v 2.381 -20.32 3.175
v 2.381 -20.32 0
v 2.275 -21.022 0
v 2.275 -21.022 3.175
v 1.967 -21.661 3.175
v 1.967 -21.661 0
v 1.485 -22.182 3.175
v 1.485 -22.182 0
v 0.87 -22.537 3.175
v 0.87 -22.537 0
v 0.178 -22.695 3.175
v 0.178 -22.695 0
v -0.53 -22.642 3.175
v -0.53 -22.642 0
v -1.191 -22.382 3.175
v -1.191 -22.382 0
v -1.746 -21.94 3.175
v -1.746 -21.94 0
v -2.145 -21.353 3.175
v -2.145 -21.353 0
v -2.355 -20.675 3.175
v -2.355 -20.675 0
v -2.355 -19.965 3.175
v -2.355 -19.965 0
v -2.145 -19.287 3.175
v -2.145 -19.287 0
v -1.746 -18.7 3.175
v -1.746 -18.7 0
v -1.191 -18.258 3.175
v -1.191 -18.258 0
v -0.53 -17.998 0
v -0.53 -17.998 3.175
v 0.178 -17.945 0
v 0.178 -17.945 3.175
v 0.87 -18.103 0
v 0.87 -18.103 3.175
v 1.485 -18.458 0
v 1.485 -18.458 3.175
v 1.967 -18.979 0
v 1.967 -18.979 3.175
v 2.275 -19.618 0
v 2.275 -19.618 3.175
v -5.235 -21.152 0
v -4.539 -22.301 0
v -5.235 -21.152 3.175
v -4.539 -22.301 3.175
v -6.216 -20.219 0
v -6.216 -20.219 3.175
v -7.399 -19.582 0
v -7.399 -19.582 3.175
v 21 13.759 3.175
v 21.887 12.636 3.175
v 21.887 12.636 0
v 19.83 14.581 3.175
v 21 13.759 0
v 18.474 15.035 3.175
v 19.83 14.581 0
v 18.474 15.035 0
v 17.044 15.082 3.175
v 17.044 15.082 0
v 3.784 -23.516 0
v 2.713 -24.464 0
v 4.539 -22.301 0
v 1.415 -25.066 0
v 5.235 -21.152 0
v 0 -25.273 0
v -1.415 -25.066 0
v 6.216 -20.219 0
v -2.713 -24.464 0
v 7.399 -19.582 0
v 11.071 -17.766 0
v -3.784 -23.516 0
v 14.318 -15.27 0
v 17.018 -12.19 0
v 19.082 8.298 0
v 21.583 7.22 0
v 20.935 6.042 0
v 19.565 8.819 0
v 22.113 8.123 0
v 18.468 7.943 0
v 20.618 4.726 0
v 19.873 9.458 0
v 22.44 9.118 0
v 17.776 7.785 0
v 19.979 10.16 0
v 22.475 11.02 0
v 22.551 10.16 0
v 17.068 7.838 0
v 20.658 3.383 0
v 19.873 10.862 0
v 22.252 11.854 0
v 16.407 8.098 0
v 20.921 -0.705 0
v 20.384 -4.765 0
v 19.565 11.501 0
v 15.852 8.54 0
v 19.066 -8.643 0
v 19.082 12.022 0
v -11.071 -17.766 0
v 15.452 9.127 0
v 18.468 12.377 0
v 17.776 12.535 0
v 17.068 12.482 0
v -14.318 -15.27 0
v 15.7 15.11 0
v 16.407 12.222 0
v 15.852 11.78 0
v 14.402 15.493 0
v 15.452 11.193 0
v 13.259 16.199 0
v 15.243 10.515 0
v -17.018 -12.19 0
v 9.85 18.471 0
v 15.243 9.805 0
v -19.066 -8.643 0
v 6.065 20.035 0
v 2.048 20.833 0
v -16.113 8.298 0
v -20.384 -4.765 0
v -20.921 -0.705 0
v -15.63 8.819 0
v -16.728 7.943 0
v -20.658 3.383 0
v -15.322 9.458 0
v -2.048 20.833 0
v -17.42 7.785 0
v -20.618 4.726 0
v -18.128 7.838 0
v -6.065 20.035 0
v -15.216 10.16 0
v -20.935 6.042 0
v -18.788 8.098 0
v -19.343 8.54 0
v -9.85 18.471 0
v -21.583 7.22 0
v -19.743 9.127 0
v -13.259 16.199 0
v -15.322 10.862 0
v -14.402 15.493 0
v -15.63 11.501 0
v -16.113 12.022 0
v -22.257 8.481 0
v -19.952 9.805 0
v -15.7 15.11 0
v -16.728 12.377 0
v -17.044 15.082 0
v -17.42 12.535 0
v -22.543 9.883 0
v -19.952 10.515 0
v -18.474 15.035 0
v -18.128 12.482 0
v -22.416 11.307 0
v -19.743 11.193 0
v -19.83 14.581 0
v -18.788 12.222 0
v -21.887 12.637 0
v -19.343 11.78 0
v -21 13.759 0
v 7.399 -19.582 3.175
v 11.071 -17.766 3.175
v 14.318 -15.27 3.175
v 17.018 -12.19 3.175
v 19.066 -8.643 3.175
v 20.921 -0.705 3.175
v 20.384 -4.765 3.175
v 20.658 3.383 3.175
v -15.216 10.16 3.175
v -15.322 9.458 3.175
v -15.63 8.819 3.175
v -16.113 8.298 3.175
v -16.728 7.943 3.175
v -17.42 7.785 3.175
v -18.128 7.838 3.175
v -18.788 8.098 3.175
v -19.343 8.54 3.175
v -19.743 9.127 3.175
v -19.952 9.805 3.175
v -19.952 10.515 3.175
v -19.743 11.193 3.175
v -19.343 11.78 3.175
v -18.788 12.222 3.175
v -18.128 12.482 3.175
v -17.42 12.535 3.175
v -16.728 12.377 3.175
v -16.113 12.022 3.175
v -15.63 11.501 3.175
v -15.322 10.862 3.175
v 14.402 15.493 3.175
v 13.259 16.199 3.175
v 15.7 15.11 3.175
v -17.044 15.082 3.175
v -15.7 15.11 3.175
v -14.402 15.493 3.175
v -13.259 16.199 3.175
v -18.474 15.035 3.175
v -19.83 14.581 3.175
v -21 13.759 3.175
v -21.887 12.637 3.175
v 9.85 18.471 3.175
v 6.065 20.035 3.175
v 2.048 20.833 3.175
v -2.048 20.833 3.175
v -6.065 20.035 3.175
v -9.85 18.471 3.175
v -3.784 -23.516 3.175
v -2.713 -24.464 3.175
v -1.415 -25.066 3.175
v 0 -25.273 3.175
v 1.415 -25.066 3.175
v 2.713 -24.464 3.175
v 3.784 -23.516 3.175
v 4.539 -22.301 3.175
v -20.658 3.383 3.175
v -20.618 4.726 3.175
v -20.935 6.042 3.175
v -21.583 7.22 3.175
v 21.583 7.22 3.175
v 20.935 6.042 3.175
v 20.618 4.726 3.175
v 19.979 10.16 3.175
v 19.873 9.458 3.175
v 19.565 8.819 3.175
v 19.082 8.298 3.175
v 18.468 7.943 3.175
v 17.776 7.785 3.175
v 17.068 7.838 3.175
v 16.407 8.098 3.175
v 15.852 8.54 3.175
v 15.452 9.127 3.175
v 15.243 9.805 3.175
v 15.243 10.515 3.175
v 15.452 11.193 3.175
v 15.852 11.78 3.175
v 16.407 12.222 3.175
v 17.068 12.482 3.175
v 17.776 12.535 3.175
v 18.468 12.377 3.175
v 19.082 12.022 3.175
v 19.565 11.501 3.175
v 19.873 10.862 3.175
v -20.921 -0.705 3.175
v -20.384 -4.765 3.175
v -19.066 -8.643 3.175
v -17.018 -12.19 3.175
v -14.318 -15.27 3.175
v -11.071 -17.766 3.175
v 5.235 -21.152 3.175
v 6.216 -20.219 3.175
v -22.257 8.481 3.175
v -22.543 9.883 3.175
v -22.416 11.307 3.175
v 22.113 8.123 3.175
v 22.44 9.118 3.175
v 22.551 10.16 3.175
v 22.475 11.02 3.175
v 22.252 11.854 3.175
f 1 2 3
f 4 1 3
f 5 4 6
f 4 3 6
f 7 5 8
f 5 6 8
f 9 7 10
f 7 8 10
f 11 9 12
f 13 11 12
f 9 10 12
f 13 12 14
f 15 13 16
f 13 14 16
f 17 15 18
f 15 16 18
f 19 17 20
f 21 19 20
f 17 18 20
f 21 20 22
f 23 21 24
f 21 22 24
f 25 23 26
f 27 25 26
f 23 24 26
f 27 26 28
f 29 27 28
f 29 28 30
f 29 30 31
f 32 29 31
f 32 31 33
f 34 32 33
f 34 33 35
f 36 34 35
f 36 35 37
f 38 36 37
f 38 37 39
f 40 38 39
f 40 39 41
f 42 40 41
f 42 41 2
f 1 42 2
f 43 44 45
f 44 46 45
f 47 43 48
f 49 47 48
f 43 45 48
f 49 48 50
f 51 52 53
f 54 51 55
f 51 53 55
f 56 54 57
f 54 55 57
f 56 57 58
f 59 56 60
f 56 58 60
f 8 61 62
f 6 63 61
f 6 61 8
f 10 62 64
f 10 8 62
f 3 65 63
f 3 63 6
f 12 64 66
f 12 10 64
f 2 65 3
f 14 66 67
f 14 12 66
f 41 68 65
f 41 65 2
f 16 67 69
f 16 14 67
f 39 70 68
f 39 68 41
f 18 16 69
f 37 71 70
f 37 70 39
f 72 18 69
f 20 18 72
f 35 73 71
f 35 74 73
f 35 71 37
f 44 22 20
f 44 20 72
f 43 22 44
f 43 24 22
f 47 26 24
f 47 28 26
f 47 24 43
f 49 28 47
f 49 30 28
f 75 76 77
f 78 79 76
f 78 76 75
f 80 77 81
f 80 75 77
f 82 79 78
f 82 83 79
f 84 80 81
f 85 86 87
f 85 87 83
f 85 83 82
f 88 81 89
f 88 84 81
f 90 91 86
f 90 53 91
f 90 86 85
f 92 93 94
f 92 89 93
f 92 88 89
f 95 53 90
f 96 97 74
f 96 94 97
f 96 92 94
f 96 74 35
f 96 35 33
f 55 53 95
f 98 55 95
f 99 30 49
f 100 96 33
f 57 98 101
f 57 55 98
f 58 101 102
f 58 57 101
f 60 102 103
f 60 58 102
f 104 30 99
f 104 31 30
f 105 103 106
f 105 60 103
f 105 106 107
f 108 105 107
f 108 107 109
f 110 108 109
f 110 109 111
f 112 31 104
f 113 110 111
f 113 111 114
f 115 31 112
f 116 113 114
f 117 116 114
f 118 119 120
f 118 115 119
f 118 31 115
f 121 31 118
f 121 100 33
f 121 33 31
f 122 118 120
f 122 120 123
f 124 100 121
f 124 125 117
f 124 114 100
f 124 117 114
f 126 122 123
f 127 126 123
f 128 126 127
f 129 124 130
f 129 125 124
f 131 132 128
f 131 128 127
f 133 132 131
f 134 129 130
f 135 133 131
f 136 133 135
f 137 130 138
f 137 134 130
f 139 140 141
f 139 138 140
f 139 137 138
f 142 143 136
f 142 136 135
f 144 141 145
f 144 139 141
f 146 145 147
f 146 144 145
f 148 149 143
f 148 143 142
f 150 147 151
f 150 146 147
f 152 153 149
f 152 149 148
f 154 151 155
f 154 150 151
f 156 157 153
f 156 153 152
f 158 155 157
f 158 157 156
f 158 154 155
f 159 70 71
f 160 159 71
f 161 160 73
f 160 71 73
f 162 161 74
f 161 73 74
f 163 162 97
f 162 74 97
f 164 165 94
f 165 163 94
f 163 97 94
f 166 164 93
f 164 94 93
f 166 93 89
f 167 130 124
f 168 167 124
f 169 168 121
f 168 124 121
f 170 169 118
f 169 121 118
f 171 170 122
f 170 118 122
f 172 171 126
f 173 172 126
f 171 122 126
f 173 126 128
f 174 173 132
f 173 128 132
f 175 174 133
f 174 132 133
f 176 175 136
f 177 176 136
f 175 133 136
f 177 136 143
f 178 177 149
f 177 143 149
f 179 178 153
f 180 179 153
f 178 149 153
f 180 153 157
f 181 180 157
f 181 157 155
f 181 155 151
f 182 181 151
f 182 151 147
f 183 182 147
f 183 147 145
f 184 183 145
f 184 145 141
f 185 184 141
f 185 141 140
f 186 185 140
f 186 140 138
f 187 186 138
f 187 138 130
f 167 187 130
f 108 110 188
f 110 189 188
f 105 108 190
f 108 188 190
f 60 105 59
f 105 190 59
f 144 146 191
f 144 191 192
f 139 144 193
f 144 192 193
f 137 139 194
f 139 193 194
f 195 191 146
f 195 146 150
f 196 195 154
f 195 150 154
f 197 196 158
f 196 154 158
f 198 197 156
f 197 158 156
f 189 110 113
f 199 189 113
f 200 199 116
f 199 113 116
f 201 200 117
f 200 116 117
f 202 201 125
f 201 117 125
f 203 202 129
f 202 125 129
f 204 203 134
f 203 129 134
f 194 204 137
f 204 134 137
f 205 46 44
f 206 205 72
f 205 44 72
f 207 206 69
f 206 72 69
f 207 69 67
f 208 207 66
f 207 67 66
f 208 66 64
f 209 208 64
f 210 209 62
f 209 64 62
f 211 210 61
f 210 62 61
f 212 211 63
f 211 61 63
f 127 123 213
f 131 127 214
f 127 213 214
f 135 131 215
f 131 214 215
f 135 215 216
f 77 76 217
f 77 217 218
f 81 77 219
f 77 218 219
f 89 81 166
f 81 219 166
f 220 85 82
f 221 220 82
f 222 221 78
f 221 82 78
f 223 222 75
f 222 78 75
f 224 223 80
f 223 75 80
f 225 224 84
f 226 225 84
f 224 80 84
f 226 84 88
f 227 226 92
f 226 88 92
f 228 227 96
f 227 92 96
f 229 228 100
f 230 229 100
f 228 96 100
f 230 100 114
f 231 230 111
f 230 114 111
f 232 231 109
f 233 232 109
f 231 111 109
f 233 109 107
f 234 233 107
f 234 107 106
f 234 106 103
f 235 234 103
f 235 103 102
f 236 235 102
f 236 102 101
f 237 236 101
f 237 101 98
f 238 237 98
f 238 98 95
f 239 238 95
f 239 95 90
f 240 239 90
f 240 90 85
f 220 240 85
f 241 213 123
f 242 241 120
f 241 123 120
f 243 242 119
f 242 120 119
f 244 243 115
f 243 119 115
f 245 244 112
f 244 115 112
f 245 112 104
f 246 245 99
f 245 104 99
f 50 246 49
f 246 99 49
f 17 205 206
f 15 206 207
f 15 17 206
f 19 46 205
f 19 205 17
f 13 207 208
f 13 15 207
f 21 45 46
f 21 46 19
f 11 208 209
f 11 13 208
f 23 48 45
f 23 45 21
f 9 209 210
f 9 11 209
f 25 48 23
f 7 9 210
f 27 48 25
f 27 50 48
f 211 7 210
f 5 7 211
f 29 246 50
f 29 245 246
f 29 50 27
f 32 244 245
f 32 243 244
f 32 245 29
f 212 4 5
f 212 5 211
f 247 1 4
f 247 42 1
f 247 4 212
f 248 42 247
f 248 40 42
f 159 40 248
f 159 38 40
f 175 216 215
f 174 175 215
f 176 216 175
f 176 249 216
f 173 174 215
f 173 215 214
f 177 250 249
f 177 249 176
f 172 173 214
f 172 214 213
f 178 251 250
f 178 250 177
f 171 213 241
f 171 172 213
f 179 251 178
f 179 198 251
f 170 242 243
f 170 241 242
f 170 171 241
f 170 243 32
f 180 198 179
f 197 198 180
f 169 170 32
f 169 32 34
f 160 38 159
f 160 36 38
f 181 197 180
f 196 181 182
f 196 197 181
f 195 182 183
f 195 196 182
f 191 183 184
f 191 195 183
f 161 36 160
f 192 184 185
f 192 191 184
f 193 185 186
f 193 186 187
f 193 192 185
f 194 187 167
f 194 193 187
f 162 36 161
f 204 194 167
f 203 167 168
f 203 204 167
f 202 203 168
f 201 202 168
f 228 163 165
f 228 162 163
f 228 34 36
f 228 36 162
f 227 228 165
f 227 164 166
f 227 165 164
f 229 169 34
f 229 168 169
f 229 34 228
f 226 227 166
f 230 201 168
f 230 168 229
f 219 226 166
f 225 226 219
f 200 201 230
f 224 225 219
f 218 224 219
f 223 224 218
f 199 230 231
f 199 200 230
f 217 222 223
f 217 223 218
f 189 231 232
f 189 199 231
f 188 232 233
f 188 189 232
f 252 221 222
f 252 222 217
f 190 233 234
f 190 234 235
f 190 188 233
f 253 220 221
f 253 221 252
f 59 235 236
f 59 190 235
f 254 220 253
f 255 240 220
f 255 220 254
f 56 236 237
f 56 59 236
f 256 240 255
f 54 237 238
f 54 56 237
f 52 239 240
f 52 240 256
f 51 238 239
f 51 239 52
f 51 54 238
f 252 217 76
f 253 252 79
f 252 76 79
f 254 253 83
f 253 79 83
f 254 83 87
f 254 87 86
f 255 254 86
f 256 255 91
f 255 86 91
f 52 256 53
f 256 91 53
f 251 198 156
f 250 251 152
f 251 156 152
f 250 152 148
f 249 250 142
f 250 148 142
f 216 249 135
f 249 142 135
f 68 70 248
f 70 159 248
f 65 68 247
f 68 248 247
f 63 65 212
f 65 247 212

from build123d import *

# Parameters (mm, degrees)
F1_W      = 8.89
F1_H      = 3.175
F3_R      = 2.38125
F4_DEPTH  = 3.176
F7_DEPTH  = 3.176
F8_R      = 5.08
F9_R      = 27.6252152017
F10_DEPTH = 17.4535782288
F11_R     = 14.5350936127
F12_DEPTH = 3.175


# Not quite as in the source:
# - a fillet or chamfer that OpenCascade refuses, or shapes differently, is made with other operations: its cross-section is extruded or revolved along the edge and cut away or added


with BuildPart() as f2:
    # F1 (on Front) → F2 (revolve)
    with BuildSketch(Plane.XZ):
        with BuildLine():
            ThreePointArc((13.208, -11.9177163316), (13.0652297207, -14.7887805254), (12.3057501177, -17.5612494052))
            Line((12.3057501177, -17.5612494052), (16.383, -17.5612494052))
            Line((16.383, -17.5612494052), (16.383, 0))
            Line((16.383, 0), (16.383, 3.175))
            Line((16.383, 3.175), (13.208, 3.175))
            Line((13.208, 3.175), (13.208, -11.9177163316))
        make_face()
        with Locations((20.828, 1.5875)):
            Rectangle(F1_W, F1_H)
    revolve(axis=Axis((0, 0, -9.4681101426), (0, 0, 1)))

    # F3 (on face) → F4 (cut, through all)
    with BuildSketch(Plane(origin=(0, 0, 0), x_dir=(1, 0, 0), z_dir=(0, 0, -1))):
        with BuildLine():
            ThreePointArc((0, 17.93875), (1.6837980227, 18.6362019773), (2.38125, 20.32))
            ThreePointArc((2.38125, 20.32), (-1.6837980227, 22.0037980227), (0, 17.93875))
        make_face()
        with Locations((-17.5976362049, -10.16)):
            Circle(F3_R)
        with Locations((17.5976362049, -10.16)):
            Circle(F3_R)
    extrude(amount=-F4_DEPTH, mode=Mode.SUBTRACT)

    # F5: fillet of radius 5.08 on 1 edges, made by hand

    # F5_s1 → F5_t2 (revolve, cut)
    with BuildSketch(Plane.XZ):
        with BuildLine():
            ThreePointArc((11.303, -17.5612494052), (14.8951024484, -16.0733518536), (16.383, -12.4812494052))
            Line((16.383, -12.4812494052), (16.383, -17.5612494052))
            Line((16.383, -17.5612494052), (11.303, -17.5612494052))
        make_face()
    revolve(axis=Axis((0, 0, -17.5612494052), (0, 0, 1)), mode=Mode.SUBTRACT)

    # F6 (on face) → F7 (cut, through all)
    with BuildSketch(Plane(origin=(0, 0, 0), x_dir=(1, 0, 0), z_dir=(0, 0, -1))):
        with BuildLine():
            ThreePointArc((-4.952964542, 20.3387415379), (-3.495667473, 23.8289197652), (0, 25.273))
            ThreePointArc((0, 25.273), (-21.8870601005, 12.6364998776), (-21.8870598885, -12.6365002448))
            ThreePointArc((-21.8870598885, -12.6365002448), (-22.3842836342, -8.8871231844), (-20.0903491238, -5.8799776515))
            ThreePointArc((-20.0903491238, -5.8799776515), (-18.1286292594, 10.4665689829), (-4.952964542, 20.3387415379))
        make_face()
        with BuildLine():
            ThreePointArc((0, 25.273), (3.495667473, 23.8289197652), (4.952964542, 20.3387415379))
            ThreePointArc((4.952964542, 20.3387415379), (18.1286292594, 10.4665689829), (20.0903491238, -5.8799776515))
            ThreePointArc((20.0903491238, -5.8799776515), (21.8917377458, -7.6916197707), (22.5506362049, -10.16))
            ThreePointArc((22.5506362049, -10.16), (22.3818668231, -11.4419307281), (21.8870600322, -12.6364999959))
            ThreePointArc((21.8870600322, -12.6364999959), (24.4118434084, -6.5411337246), (25.273, 0))
            ThreePointArc((25.273, 0), (17.8707096809, 17.8707096809), (0, 25.273))
        make_face()
        with BuildLine():
            ThreePointArc((-15.1373845818, -14.4587638864), (-18.8886159884, -14.9417967542), (-21.8870598885, -12.6365002448))
            ThreePointArc((-21.8870598885, -12.6365002448), (1.437e-07, -25.273), (21.8870600322, -12.6364999959))
            ThreePointArc((21.8870600322, -12.6364999959), (18.8886161272, -14.9417967167), (15.1373845818, -14.4587638864))
            ThreePointArc((15.1373845818, -14.4587638864), (0, -20.9331379659), (-15.1373845818, -14.4587638864))
        make_face()
    extrude(amount=-F7_DEPTH, mode=Mode.SUBTRACT)

    # F8
    f8_edges = [f2.edges().sort_by_distance(p)[0] for p in [
        (-15.137385, 14.458764, 1.5875),
        (15.137385, 14.458764, 1.5875),
        (20.090349, 5.879978, 1.5875),
        (4.952965, -20.338742, 1.5875),
        (-4.952965, -20.338742, 1.5875),
        (-20.090349, 5.879978, 1.5875),
    ]]
    fillet(f8_edges, radius=F8_R)

    # F9 (on Top) → F10 (cut, through all)
    with BuildSketch(Plane.XY):
        Circle(F9_R)
    extrude(amount=-F10_DEPTH, mode=Mode.SUBTRACT)

    # F11 (on face) → F12 (join)
    with BuildSketch(Plane(origin=(0, 0, 0), x_dir=(1, 0, 0), z_dir=(0, 0, -1))):
        Circle(F11_R)
    extrude(amount=-F12_DEPTH)


solid = f2.part
